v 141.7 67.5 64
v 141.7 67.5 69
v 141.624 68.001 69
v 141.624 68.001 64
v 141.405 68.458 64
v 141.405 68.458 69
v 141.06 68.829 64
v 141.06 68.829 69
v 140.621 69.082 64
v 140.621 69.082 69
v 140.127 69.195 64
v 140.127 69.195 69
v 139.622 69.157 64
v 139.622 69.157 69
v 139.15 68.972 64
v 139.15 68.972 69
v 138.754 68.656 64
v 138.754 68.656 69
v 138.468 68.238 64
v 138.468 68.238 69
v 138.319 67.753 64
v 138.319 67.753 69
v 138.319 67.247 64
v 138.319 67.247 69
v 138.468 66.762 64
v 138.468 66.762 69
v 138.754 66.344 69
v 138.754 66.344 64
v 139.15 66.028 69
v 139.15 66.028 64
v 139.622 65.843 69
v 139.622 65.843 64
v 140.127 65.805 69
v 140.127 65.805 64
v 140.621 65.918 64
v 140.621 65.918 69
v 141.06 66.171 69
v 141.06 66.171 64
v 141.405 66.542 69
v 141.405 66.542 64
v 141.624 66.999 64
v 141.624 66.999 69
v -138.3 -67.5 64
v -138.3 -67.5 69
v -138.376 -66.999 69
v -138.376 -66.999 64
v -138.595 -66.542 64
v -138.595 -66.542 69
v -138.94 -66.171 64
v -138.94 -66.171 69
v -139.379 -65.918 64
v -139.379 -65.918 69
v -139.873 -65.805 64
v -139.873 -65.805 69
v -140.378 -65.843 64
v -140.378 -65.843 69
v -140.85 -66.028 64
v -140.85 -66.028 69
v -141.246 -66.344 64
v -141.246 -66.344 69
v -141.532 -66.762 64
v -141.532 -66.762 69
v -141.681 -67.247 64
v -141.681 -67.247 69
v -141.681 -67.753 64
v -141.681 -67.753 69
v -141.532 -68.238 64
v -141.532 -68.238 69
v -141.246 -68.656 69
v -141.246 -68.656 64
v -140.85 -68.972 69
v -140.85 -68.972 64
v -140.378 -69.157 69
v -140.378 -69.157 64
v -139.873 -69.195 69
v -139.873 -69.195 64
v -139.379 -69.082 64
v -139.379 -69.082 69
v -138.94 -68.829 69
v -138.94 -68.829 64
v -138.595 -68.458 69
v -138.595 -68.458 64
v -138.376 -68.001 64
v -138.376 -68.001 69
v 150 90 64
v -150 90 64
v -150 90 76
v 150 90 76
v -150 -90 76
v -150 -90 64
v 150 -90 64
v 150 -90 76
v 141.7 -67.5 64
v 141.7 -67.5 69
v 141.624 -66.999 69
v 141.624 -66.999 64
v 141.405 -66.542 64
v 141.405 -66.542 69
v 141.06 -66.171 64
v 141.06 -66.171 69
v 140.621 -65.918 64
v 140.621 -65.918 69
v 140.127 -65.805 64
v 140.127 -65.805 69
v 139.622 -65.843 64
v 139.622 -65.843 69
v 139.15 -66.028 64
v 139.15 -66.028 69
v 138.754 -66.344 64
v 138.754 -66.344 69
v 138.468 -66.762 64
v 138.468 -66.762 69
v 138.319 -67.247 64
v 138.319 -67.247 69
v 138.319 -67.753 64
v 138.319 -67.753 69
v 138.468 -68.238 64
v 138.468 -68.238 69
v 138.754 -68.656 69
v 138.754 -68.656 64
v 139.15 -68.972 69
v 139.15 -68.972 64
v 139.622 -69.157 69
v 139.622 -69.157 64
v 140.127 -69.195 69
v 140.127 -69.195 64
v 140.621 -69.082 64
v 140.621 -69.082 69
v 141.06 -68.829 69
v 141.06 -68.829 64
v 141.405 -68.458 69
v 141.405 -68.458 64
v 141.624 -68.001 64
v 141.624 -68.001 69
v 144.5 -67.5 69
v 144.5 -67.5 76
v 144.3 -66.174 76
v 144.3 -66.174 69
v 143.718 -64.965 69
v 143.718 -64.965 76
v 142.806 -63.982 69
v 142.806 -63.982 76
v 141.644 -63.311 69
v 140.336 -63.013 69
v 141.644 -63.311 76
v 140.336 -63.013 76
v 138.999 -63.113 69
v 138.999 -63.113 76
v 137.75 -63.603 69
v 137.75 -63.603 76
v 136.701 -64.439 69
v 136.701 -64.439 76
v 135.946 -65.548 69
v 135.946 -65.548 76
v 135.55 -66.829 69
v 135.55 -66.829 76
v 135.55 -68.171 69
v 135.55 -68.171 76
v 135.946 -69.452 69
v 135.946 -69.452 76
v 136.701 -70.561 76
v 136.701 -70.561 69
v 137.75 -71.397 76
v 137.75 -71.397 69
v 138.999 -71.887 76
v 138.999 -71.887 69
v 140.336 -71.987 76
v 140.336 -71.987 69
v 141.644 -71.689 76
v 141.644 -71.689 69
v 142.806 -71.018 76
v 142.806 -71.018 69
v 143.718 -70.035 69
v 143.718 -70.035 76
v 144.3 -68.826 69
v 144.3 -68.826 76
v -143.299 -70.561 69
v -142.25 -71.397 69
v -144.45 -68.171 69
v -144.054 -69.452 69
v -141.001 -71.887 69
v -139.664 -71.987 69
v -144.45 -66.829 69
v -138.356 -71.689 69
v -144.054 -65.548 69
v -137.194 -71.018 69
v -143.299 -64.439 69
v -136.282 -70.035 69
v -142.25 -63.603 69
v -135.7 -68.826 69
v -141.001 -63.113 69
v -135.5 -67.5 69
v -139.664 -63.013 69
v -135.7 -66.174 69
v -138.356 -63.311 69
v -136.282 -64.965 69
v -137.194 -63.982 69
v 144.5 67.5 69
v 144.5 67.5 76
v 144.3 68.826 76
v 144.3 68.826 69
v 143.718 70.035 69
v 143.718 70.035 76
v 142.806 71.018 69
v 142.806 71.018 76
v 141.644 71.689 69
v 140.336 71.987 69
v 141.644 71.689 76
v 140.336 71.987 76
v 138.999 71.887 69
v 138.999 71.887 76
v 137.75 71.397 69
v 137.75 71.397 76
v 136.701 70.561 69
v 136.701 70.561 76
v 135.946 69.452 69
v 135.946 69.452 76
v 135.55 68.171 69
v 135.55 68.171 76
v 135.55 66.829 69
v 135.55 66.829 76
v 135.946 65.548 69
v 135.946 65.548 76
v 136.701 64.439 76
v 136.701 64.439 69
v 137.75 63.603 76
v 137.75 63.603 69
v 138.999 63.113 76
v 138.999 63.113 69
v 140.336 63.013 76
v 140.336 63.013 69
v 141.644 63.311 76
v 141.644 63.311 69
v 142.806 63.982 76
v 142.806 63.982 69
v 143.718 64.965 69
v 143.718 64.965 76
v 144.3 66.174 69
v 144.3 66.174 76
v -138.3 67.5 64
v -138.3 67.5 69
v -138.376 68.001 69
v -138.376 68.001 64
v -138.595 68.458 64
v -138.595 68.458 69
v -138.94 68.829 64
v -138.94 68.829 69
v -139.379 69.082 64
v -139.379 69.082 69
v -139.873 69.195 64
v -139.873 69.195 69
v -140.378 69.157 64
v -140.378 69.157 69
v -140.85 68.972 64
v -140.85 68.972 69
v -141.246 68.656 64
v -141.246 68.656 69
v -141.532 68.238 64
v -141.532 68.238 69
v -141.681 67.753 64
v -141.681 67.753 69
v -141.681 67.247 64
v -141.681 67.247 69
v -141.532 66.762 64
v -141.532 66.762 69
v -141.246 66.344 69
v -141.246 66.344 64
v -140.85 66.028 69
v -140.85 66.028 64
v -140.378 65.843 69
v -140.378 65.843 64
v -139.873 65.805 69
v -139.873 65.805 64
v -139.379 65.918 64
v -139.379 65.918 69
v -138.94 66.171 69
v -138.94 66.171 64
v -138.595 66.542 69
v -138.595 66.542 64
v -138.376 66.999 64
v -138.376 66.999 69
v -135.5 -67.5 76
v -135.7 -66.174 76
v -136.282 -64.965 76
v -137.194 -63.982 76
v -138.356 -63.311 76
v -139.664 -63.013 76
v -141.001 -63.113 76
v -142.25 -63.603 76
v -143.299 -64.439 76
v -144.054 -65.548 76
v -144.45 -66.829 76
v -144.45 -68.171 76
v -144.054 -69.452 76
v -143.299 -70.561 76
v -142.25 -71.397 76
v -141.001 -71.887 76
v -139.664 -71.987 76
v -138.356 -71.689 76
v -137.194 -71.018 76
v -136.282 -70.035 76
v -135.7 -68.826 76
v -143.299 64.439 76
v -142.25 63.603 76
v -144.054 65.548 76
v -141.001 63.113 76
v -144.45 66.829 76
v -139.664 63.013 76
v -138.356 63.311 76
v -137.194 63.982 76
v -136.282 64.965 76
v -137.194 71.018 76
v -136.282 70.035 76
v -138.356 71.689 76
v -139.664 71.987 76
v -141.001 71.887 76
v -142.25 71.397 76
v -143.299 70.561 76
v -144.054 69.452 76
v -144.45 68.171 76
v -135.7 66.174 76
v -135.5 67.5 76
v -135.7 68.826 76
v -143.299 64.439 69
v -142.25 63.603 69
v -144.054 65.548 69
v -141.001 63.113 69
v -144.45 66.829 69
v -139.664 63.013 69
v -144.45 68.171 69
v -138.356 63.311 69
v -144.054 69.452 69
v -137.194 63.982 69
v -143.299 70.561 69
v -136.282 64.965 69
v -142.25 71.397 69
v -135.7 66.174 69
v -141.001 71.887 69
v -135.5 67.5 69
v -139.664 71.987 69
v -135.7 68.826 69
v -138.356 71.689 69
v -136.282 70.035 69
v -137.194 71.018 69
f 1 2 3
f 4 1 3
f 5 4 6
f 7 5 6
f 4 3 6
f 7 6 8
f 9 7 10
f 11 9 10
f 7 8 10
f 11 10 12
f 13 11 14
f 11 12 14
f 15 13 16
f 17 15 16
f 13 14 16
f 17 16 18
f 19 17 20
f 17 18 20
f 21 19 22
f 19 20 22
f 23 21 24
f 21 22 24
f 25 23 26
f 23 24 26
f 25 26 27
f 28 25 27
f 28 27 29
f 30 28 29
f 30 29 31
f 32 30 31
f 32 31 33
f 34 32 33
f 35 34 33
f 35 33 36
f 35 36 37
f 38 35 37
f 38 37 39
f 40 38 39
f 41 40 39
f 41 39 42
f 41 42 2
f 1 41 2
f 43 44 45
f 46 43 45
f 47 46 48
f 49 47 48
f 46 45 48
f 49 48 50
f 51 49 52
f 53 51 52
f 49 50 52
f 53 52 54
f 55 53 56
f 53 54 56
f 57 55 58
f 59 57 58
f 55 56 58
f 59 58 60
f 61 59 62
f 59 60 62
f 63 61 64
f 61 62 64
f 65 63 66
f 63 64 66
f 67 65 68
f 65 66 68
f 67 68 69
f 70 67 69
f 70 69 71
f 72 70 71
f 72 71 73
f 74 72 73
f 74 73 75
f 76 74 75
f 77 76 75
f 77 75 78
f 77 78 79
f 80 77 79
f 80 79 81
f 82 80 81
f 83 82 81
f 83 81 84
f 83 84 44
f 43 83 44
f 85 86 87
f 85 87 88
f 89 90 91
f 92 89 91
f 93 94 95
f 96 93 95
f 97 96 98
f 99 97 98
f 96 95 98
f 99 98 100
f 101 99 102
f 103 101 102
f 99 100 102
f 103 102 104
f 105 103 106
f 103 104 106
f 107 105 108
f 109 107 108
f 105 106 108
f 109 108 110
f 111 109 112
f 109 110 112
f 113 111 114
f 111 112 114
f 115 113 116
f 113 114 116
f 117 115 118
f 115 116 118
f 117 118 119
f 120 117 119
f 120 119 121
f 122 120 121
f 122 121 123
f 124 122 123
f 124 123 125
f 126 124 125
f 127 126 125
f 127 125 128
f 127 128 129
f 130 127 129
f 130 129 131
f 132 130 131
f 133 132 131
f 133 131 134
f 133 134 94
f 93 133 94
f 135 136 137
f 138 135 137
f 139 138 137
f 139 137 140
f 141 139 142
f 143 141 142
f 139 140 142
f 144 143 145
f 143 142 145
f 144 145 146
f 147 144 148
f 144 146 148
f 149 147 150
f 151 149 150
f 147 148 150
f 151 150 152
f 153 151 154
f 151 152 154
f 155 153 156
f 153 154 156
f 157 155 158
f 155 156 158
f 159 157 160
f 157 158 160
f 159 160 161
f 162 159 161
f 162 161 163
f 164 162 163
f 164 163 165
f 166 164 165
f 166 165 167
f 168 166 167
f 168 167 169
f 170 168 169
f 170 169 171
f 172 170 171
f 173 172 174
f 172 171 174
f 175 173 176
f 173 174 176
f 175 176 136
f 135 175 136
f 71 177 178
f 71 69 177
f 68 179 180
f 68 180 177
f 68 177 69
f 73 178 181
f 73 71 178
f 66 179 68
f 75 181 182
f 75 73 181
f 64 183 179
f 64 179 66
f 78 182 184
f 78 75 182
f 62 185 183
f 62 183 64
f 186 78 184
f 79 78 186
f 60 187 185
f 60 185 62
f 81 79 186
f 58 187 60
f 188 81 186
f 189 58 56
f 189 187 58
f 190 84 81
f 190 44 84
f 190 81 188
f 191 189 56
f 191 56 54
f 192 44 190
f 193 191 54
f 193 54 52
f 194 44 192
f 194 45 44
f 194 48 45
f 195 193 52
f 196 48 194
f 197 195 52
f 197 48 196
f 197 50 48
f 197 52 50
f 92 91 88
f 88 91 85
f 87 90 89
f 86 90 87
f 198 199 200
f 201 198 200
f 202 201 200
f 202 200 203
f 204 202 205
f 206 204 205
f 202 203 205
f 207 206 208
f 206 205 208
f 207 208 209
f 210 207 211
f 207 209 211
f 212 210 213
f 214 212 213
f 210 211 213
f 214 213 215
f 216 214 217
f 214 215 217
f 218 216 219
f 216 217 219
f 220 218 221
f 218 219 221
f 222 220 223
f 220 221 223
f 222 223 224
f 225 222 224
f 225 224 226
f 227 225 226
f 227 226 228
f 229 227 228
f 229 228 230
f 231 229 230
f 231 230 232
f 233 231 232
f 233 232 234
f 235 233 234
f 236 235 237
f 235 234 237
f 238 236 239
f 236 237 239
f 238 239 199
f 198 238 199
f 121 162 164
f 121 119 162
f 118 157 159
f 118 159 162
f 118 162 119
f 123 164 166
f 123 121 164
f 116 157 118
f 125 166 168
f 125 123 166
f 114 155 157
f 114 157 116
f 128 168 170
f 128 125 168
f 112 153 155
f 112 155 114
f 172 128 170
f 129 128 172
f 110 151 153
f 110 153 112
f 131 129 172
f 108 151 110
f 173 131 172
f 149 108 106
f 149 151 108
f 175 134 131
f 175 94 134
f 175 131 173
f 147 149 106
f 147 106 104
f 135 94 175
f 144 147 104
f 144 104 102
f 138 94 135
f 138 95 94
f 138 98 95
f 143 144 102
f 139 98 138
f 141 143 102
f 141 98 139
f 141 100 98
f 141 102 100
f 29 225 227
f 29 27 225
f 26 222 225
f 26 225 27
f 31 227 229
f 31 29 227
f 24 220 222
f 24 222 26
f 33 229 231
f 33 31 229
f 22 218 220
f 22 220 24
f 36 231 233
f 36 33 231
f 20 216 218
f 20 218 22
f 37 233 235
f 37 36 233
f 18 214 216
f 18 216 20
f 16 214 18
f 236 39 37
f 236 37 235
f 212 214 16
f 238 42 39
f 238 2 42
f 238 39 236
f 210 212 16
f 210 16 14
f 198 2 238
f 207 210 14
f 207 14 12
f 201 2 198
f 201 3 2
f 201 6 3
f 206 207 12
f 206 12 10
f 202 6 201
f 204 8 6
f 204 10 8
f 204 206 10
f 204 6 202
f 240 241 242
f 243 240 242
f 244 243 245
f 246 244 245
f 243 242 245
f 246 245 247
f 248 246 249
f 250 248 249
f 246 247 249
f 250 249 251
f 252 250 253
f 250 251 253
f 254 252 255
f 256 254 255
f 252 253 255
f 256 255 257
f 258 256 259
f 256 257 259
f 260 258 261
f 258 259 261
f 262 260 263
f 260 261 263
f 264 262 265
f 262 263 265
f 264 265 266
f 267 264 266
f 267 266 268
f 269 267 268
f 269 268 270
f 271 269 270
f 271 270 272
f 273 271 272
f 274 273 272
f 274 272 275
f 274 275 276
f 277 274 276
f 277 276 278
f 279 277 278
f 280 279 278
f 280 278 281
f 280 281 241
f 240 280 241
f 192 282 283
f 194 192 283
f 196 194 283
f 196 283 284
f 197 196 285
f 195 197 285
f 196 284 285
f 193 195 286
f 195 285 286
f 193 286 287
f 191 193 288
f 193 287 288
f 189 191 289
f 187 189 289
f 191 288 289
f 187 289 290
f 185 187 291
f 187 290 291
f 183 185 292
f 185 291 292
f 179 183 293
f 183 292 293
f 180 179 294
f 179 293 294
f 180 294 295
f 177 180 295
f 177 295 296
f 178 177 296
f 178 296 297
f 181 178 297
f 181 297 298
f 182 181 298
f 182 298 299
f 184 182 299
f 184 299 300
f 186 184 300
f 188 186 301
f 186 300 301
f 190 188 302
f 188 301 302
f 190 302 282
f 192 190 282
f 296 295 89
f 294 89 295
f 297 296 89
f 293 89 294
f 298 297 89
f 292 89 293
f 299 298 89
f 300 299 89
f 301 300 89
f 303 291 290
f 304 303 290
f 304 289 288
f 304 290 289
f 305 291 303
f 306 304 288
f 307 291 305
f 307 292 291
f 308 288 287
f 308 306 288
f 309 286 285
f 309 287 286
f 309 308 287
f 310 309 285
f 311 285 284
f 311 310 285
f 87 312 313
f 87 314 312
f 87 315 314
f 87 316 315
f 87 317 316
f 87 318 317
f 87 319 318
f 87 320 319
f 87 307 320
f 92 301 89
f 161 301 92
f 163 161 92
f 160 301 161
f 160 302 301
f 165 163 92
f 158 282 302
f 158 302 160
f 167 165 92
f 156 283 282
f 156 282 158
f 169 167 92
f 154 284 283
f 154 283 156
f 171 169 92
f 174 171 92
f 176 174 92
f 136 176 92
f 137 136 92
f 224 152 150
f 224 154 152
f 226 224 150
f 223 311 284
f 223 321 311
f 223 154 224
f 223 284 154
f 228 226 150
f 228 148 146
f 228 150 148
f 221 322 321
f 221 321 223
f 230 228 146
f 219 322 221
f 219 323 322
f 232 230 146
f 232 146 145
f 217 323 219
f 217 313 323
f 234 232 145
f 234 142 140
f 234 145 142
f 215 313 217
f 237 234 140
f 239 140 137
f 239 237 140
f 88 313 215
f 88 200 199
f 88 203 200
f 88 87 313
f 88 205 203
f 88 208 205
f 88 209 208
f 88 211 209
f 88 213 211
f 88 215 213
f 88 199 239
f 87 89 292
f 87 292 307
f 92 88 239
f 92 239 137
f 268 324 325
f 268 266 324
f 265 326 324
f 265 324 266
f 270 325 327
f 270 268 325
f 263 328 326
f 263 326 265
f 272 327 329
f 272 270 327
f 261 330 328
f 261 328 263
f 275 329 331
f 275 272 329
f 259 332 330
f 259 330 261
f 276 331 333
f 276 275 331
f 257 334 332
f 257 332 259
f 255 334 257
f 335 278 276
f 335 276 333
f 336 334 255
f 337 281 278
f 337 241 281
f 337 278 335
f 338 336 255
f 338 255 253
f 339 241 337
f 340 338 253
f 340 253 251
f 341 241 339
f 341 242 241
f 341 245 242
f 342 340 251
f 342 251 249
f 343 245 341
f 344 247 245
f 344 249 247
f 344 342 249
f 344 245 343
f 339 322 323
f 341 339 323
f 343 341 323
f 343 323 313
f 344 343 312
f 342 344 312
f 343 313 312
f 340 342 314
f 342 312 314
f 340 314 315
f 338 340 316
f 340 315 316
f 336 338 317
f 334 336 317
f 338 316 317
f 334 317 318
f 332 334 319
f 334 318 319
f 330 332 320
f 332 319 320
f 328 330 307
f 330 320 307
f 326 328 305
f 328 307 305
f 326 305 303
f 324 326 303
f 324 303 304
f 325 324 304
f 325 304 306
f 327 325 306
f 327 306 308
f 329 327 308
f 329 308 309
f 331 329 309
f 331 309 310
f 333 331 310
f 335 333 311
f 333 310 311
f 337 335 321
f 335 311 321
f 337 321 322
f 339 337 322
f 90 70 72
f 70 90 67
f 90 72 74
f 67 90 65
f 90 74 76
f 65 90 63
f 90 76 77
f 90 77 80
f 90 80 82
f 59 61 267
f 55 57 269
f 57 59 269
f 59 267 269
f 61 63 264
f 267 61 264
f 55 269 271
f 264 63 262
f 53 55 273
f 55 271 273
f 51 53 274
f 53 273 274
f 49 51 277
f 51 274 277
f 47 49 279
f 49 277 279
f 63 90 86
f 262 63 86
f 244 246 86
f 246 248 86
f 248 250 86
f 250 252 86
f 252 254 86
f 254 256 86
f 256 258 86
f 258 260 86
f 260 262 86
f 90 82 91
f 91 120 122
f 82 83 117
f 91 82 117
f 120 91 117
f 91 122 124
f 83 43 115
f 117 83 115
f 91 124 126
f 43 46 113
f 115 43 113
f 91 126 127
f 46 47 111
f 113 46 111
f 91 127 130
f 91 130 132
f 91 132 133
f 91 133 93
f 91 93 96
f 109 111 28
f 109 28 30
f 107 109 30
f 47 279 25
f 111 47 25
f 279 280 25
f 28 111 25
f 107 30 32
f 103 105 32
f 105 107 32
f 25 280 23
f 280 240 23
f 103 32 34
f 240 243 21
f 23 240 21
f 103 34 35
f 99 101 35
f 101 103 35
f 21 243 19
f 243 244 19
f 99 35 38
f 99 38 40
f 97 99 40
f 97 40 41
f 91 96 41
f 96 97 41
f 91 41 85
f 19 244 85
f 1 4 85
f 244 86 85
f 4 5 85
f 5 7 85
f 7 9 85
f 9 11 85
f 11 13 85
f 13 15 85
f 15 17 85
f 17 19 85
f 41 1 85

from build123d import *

# Parameters (mm, degrees)
SKETCH003_W     = 300
SKETCH003_H     = 180
PAD002_DEPTH    = 12
SKETCH004_R     = 4.5
POCKET_DEPTH    = 7
SKETCH005_R     = 1.7
POCKET001_DEPTH = 12.001


with BuildPart() as part:
    # Sketch003 → Pad002 (new body)
    with BuildSketch(Plane.XY):
        Rectangle(SKETCH003_W, SKETCH003_H)
    extrude(amount=PAD002_DEPTH)

    # Sketch004 (on Face6 of Pad002) → Pocket (cut)
    with BuildSketch(Plane.XY.offset(12)):
        with Locations((-140, 67.5)):
            Circle(SKETCH004_R)
        with Locations((-140, -67.5)):
            Circle(SKETCH004_R)
        with Locations((140, -67.5)):
            Circle(SKETCH004_R)
        with Locations((140, 67.5)):
            Circle(SKETCH004_R)
    extrude(amount=-POCKET_DEPTH, mode=Mode.SUBTRACT)

    # Sketch005 (on Face5 of Pocket) → Pocket001 (cut, through all)
    with BuildSketch(Plane.XY.offset(12)):
        with Locations((-140, 67.5)):
            Circle(SKETCH005_R)
        with Locations((-140, -67.5)):
            Circle(SKETCH005_R)
        with Locations((140, -67.5)):
            Circle(SKETCH005_R)
        with Locations((140, 67.5)):
            Circle(SKETCH005_R)
    extrude(amount=-POCKET001_DEPTH, mode=Mode.SUBTRACT)


with BuildPart() as part_1:
    # Body002 placement: moved
    add(part.part.moved(Location((0, 0, 64))))


solid = part_1.part
